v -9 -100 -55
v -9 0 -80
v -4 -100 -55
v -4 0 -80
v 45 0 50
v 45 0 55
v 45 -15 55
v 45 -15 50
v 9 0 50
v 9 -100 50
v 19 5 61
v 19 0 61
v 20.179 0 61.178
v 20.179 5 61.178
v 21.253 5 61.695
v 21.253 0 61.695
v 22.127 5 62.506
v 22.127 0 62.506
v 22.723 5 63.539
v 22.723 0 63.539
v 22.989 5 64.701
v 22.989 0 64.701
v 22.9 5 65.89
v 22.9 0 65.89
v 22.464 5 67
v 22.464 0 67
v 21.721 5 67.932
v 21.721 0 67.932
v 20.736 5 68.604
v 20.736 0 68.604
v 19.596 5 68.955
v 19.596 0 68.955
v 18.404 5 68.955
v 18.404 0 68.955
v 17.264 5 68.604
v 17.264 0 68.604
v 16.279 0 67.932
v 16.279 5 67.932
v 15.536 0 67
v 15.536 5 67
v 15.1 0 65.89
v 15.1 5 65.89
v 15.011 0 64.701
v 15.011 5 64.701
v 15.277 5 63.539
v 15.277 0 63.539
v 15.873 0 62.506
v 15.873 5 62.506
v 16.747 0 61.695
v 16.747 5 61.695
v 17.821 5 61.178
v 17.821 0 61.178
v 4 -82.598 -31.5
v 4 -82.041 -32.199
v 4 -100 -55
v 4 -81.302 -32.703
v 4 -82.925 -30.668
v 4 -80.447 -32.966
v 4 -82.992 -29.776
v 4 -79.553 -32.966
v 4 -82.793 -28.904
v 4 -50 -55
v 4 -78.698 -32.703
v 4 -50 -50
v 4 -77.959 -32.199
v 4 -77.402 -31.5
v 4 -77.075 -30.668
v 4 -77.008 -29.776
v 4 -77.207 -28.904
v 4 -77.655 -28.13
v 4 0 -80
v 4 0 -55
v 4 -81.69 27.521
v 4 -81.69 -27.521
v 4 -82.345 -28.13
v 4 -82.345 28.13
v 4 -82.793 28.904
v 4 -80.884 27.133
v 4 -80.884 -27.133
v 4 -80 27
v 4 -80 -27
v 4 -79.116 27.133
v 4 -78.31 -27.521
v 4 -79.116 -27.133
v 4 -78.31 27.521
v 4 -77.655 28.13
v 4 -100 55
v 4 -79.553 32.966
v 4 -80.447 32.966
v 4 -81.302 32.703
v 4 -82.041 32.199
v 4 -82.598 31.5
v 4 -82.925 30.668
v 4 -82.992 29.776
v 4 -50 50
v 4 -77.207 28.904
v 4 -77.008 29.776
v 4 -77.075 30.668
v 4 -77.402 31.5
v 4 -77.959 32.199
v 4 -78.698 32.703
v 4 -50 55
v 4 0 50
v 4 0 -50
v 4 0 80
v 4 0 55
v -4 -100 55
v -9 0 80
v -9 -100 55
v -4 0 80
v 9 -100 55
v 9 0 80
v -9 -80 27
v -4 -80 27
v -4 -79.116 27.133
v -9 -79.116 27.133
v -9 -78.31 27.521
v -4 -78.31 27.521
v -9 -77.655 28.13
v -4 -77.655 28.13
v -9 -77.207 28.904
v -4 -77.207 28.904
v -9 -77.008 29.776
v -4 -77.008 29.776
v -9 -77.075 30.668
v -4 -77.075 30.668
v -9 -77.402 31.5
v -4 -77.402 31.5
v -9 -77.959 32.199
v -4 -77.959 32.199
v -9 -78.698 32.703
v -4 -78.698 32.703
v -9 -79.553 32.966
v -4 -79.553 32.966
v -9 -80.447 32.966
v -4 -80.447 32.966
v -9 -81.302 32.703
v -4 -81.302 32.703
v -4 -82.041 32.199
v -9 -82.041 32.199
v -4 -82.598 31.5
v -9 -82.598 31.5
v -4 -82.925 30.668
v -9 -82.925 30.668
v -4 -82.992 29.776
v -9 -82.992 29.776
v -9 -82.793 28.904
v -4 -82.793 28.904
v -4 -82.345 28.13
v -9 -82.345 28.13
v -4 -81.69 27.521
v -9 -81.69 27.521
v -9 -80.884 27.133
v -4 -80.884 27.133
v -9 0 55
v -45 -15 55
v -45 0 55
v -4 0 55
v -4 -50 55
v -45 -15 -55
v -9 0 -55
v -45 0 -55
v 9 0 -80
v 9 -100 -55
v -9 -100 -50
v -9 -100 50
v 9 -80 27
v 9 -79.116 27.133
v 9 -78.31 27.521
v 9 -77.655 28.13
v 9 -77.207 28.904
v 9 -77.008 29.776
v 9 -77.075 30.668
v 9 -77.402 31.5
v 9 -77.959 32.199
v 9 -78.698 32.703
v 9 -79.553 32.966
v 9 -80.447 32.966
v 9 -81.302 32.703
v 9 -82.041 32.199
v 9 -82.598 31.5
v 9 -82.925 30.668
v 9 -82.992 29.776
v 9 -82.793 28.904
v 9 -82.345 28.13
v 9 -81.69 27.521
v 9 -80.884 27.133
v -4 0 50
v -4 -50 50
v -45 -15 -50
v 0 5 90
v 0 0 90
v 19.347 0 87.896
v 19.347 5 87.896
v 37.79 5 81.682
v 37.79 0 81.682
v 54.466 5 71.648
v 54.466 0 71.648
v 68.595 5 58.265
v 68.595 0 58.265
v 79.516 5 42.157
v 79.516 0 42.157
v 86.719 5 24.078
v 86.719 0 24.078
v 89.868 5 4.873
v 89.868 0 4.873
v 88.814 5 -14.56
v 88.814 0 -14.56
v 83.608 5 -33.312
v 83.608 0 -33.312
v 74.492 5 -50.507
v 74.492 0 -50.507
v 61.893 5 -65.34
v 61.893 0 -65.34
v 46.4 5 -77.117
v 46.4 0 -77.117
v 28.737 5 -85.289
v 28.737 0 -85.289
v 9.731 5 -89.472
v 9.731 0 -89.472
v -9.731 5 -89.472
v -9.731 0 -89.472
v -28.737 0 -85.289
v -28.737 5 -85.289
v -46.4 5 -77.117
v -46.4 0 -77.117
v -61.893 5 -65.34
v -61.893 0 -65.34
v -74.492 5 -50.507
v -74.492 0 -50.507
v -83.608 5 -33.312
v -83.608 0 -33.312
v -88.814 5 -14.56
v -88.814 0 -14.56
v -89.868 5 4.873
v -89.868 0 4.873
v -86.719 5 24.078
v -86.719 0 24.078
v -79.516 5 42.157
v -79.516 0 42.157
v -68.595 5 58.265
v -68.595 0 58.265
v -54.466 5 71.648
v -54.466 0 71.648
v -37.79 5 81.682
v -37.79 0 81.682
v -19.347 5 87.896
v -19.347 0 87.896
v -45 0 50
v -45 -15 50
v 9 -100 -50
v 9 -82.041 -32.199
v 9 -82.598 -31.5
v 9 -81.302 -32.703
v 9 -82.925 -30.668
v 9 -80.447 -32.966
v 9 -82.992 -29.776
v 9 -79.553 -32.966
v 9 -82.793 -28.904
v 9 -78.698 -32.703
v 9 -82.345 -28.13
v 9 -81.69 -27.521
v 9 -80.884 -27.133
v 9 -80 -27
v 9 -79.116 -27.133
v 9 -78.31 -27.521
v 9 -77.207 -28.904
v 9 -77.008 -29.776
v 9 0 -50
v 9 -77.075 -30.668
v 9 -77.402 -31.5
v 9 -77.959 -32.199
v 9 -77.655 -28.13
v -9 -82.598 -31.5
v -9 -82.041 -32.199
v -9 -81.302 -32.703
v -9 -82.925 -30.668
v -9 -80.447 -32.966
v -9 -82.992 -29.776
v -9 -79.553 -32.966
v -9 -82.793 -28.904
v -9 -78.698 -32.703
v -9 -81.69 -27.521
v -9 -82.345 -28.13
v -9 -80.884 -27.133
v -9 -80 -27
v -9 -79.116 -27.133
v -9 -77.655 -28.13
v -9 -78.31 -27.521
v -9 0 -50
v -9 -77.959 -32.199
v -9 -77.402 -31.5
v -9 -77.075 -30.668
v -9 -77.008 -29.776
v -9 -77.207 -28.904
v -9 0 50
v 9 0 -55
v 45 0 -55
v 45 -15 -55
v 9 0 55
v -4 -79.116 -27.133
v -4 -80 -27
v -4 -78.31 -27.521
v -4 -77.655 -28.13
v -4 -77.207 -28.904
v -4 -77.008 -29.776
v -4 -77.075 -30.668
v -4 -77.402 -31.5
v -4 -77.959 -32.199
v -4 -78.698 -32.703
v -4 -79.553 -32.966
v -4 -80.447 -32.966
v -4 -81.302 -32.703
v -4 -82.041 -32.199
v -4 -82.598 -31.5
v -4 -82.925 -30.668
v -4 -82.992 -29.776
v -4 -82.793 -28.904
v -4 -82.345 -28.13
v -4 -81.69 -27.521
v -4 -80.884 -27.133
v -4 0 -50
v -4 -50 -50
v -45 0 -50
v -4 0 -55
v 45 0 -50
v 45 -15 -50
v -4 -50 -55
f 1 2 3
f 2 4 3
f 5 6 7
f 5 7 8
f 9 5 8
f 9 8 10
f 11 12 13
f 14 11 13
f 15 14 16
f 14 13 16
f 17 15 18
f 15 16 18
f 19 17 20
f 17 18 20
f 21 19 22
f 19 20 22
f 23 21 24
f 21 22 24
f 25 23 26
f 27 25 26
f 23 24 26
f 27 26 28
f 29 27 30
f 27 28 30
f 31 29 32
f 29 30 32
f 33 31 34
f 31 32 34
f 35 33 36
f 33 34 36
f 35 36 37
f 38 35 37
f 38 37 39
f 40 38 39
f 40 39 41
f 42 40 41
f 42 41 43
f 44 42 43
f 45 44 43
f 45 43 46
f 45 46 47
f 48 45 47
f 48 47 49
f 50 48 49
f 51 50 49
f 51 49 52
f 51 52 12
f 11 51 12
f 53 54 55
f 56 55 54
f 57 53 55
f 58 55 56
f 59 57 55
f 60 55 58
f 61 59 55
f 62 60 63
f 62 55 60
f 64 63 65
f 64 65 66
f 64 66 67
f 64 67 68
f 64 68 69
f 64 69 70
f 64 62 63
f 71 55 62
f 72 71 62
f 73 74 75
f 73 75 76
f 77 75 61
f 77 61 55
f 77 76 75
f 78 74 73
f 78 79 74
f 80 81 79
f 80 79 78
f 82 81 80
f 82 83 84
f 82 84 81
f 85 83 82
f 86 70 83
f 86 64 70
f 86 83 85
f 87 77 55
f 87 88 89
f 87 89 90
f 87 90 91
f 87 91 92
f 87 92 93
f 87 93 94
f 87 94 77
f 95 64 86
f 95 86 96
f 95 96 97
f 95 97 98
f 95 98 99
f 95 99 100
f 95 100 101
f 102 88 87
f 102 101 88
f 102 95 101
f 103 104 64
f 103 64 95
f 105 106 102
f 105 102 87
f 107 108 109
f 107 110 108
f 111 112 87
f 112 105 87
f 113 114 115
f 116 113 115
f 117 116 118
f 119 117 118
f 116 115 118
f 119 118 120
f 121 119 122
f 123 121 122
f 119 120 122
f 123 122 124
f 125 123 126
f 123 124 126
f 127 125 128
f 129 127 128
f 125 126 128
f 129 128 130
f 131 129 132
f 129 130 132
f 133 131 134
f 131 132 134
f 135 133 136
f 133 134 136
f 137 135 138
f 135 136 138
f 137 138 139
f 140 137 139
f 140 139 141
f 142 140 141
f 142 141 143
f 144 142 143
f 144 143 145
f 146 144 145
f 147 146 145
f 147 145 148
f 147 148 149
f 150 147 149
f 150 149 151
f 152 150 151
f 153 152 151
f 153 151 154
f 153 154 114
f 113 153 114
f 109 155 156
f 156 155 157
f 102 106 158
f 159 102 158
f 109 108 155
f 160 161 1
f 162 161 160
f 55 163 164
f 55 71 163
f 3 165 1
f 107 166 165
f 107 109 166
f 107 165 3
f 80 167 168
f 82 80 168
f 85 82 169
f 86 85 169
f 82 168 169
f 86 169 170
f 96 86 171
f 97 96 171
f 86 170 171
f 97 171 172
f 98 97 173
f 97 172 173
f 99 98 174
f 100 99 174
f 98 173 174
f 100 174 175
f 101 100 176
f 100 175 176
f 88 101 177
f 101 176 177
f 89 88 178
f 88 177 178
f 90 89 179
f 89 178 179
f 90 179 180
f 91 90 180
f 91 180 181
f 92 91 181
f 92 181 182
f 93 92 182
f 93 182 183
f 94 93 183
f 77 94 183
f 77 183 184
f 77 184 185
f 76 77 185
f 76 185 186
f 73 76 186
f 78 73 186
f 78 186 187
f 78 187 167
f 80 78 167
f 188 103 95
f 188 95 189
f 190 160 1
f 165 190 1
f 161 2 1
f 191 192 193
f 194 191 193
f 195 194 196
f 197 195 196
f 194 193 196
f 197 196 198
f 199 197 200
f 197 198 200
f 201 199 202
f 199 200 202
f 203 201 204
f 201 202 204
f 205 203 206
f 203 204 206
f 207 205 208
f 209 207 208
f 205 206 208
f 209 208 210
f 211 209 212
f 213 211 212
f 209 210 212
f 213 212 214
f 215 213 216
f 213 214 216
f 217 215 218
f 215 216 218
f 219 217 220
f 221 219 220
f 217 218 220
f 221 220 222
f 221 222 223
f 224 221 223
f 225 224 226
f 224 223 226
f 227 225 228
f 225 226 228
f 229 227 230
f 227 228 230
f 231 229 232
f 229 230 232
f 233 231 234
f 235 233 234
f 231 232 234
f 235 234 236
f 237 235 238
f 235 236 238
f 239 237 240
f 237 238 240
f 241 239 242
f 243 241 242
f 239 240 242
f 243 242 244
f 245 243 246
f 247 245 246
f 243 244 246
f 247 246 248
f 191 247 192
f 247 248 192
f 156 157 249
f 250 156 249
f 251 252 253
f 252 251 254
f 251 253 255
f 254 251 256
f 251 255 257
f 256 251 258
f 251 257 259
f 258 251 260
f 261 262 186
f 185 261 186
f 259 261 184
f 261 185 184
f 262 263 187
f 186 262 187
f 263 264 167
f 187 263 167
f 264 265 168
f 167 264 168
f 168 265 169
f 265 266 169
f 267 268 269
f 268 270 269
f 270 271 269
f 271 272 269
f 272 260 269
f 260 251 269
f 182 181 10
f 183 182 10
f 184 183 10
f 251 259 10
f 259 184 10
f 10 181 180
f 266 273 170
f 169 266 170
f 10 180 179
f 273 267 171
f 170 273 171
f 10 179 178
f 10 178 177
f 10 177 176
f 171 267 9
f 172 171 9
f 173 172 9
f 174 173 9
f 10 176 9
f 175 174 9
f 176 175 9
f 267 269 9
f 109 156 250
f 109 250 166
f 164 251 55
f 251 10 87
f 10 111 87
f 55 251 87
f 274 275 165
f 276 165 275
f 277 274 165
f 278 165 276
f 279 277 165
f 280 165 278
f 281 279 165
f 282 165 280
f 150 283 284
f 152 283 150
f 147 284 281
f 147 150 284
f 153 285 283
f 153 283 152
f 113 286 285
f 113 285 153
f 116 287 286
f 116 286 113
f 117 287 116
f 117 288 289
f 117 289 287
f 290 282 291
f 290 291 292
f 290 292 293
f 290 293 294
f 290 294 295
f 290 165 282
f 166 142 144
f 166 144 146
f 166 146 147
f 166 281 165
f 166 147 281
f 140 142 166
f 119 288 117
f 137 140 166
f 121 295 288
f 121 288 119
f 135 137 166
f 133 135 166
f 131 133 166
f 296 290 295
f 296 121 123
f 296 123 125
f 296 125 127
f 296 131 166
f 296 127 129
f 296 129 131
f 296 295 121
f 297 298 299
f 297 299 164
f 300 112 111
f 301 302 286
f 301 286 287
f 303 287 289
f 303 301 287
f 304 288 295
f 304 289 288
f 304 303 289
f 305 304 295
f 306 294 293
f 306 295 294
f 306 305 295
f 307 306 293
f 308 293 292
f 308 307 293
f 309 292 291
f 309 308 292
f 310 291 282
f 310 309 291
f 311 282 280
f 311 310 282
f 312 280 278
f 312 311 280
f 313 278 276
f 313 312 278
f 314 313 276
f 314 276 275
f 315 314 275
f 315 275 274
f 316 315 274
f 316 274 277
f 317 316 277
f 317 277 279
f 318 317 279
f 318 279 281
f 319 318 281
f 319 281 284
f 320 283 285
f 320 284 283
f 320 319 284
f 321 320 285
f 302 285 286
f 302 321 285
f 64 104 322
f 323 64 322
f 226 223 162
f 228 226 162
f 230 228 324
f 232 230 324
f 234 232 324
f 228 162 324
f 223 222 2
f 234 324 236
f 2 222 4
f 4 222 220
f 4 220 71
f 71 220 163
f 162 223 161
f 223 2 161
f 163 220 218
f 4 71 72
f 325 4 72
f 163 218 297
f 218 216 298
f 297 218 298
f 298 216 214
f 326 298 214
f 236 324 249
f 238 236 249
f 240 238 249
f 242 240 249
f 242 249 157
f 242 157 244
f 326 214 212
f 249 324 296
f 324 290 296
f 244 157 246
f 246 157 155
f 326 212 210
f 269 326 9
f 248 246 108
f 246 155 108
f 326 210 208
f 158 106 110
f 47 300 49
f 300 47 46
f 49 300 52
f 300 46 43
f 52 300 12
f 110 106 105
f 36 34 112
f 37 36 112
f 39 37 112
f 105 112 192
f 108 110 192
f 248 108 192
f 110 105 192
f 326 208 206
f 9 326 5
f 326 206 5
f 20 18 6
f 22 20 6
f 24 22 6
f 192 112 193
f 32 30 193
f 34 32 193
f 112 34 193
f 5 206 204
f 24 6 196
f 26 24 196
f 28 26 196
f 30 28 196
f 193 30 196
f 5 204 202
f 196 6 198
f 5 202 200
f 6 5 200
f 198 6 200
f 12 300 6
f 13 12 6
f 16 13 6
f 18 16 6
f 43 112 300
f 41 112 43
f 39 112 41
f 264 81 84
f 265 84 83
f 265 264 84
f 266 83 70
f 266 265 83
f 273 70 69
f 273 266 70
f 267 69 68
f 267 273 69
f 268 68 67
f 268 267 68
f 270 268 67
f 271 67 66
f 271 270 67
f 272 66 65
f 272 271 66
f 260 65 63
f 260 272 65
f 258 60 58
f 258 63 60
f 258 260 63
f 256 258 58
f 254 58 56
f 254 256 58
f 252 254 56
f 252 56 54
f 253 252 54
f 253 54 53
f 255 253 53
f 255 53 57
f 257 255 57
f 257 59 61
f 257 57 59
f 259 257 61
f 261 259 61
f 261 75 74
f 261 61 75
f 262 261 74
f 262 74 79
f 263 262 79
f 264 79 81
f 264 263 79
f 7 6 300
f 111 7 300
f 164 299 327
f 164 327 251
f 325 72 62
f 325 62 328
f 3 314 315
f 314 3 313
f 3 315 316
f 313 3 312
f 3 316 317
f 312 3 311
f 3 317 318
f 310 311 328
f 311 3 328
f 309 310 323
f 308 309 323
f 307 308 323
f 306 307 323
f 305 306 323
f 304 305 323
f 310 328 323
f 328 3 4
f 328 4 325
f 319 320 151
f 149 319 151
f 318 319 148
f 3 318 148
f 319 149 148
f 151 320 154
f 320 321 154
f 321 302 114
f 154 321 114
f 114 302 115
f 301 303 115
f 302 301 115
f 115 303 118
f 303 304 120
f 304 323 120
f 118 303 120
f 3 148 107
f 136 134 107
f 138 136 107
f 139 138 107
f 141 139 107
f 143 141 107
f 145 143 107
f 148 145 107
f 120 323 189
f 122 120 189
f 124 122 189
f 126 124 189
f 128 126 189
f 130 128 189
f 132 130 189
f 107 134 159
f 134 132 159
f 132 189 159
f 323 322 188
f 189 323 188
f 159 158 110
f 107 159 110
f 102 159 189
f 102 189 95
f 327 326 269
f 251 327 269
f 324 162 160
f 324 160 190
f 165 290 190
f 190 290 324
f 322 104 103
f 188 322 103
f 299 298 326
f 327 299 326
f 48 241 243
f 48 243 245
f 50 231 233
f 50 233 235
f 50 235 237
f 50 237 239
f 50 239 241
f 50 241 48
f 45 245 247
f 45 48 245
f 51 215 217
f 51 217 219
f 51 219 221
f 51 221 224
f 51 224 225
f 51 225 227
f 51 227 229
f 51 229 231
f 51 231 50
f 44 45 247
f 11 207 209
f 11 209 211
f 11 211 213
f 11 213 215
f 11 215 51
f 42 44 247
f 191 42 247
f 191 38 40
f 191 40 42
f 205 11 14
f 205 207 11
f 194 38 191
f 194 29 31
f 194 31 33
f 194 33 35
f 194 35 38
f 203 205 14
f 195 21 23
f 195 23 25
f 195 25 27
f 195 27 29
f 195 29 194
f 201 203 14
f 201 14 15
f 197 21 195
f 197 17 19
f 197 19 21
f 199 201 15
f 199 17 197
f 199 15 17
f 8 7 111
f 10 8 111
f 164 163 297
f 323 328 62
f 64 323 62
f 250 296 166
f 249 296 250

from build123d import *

# Parameters (mm, degrees)
SKETCH1_R            = 90
BOSS_EXTRUDE1_DEPTH  = 5
SKETCH2_W            = 90
SKETCH2_H            = 5
BOSS_EXTRUDE2_DEPTH  = 100
CUT_EXTRUDE1_DEPTH   = 100
SKETCH4_W            = 8
SKETCH4_H            = 50
CUT_EXTRUDE2_DEPTH   = 198.800404449
MIRROR2_COPY_1_DEPTH = 100
SKETCH5_W            = 5
SKETCH5_H            = 100
BOSS_EXTRUDE3_DEPTH  = 100
BOSS_EXTRUDE4_DEPTH  = 2.5
MIRROR5_COPY_1_DEPTH = 2.5
SKETCH7_R            = 3
CUT_EXTRUDE3_DEPTH   = 168.03592428
SKETCH8_R            = 4
CUT_EXTRUDE4_DEPTH   = 162.864140562


with BuildPart() as part:
    # Sketch1 → Boss-Extrude1 (new body)
    with BuildSketch(Plane(origin=(0, 0, 0), x_dir=(1, 0, 0), z_dir=(0, 1, 0))):
        with Locations(Location((0, 0, 0), (0, 0, 270))):
            Circle(SKETCH1_R)
    extrude(amount=BOSS_EXTRUDE1_DEPTH)

    # Sketch2 → Boss-Extrude2 (add)
    with BuildSketch(Plane(origin=(0, 0, 0), x_dir=(-1, 0, 0), z_dir=(0, -1, 0))):
        with Locations((0, -52.5)):
            Rectangle(SKETCH2_W, SKETCH2_H)
    boss_extrude2 = extrude(amount=BOSS_EXTRUDE2_DEPTH)

    # Sketch3 → Cut-Extrude1 (cut)
    with BuildSketch(Plane.XY.offset(55)):
        Polygon((45, -15), (9, -100), (45, -100), align=None)
    cut_extrude1 = extrude(amount=-CUT_EXTRUDE1_DEPTH, mode=Mode.SUBTRACT)

    # Mirror1: Cut-Extrude1 across plane
    add(cut_extrude1.mirror(Plane(origin=(0, 0, 0), x_dir=(0, 0, 1), z_dir=(1, 0, 0))), mode=Mode.SUBTRACT)

    # Sketch4 → Cut-Extrude2 (cut, through all)
    with BuildSketch(Plane.XY.offset(55)):
        with Locations((0, -75)):
            Rectangle(SKETCH4_W, SKETCH4_H)
    cut_extrude2 = extrude(amount=-CUT_EXTRUDE2_DEPTH, mode=Mode.SUBTRACT)

    # Mirror2: Boss-Extrude2, Cut-Extrude1, Cut-Extrude2 across plane
    add(boss_extrude2.mirror(Plane.XY))
    add(cut_extrude1.mirror(Plane.XY), mode=Mode.SUBTRACT)
    add(cut_extrude2.mirror(Plane.XY), mode=Mode.SUBTRACT)

    # Mirror2 copy 1 sketch → Mirror2 copy 1 (cut)
    with BuildSketch(Plane(origin=(0, 0, -55), x_dir=(-1, 0, 0), z_dir=(0, 0, -1))):
        Polygon((45, -15), (9, -100), (45, -100), align=None)
    extrude(amount=-MIRROR2_COPY_1_DEPTH, mode=Mode.SUBTRACT)

    # Sketch5 → Boss-Extrude3 (add)
    with BuildSketch(Plane.XZ):
        with Locations((-6.5, 0)):
            Rectangle(SKETCH5_W, SKETCH5_H)
    boss_extrude3 = extrude(amount=BOSS_EXTRUDE3_DEPTH)

    # Mirror3: Boss-Extrude3 across plane
    add(boss_extrude3.mirror(Plane(origin=(0, 0, 0), x_dir=(0, 0, 1), z_dir=(1, 0, 0))))

    # Sketch6 → Boss-Extrude4 (add, symmetric)
    with BuildSketch(Plane(origin=(-6.5, 0, 0), x_dir=(0, 0, -1), z_dir=(1, 0, 0))):
        Polygon((-55, -100), (-55, 0), (-80, 0), align=None)
    boss_extrude4 = extrude(amount=BOSS_EXTRUDE4_DEPTH, both=True)

    # Mirror4: Boss-Extrude4 across plane
    add(boss_extrude4.mirror(Plane(origin=(0, 0, 0), x_dir=(0, 0, 1), z_dir=(1, 0, 0))))

    # Mirror5: Boss-Extrude4 across plane
    add(boss_extrude4.mirror(Plane.XY))

    # Mirror5 copy 1 sketch → Mirror5 copy 1 (add, symmetric)
    with BuildSketch(Plane.ZY.offset(-6.5)):
        Polygon((-55, -100), (-55, 0), (-80, 0), align=None)
    extrude(amount=MIRROR5_COPY_1_DEPTH, both=True)

    # Sketch7 → Cut-Extrude3 (cut, through all)
    with BuildSketch(Plane(origin=(9, 0, 0), x_dir=(0, 0, -1), z_dir=(1, 0, 0))):
        with Locations((-30, -80)):
            Circle(SKETCH7_R)
    cut_extrude3 = extrude(amount=-CUT_EXTRUDE3_DEPTH, mode=Mode.SUBTRACT)

    # Mirror6: Cut-Extrude3 across plane
    add(cut_extrude3.mirror(Plane.XY), mode=Mode.SUBTRACT)

    # Sketch8 → Cut-Extrude4 (cut, through all)
    with BuildSketch(Plane.XZ):
        with Locations(Location((19, 65, 0), (0, 0, 270))):
            Circle(SKETCH8_R)
    extrude(amount=-CUT_EXTRUDE4_DEPTH, mode=Mode.SUBTRACT)


solid = part.part
